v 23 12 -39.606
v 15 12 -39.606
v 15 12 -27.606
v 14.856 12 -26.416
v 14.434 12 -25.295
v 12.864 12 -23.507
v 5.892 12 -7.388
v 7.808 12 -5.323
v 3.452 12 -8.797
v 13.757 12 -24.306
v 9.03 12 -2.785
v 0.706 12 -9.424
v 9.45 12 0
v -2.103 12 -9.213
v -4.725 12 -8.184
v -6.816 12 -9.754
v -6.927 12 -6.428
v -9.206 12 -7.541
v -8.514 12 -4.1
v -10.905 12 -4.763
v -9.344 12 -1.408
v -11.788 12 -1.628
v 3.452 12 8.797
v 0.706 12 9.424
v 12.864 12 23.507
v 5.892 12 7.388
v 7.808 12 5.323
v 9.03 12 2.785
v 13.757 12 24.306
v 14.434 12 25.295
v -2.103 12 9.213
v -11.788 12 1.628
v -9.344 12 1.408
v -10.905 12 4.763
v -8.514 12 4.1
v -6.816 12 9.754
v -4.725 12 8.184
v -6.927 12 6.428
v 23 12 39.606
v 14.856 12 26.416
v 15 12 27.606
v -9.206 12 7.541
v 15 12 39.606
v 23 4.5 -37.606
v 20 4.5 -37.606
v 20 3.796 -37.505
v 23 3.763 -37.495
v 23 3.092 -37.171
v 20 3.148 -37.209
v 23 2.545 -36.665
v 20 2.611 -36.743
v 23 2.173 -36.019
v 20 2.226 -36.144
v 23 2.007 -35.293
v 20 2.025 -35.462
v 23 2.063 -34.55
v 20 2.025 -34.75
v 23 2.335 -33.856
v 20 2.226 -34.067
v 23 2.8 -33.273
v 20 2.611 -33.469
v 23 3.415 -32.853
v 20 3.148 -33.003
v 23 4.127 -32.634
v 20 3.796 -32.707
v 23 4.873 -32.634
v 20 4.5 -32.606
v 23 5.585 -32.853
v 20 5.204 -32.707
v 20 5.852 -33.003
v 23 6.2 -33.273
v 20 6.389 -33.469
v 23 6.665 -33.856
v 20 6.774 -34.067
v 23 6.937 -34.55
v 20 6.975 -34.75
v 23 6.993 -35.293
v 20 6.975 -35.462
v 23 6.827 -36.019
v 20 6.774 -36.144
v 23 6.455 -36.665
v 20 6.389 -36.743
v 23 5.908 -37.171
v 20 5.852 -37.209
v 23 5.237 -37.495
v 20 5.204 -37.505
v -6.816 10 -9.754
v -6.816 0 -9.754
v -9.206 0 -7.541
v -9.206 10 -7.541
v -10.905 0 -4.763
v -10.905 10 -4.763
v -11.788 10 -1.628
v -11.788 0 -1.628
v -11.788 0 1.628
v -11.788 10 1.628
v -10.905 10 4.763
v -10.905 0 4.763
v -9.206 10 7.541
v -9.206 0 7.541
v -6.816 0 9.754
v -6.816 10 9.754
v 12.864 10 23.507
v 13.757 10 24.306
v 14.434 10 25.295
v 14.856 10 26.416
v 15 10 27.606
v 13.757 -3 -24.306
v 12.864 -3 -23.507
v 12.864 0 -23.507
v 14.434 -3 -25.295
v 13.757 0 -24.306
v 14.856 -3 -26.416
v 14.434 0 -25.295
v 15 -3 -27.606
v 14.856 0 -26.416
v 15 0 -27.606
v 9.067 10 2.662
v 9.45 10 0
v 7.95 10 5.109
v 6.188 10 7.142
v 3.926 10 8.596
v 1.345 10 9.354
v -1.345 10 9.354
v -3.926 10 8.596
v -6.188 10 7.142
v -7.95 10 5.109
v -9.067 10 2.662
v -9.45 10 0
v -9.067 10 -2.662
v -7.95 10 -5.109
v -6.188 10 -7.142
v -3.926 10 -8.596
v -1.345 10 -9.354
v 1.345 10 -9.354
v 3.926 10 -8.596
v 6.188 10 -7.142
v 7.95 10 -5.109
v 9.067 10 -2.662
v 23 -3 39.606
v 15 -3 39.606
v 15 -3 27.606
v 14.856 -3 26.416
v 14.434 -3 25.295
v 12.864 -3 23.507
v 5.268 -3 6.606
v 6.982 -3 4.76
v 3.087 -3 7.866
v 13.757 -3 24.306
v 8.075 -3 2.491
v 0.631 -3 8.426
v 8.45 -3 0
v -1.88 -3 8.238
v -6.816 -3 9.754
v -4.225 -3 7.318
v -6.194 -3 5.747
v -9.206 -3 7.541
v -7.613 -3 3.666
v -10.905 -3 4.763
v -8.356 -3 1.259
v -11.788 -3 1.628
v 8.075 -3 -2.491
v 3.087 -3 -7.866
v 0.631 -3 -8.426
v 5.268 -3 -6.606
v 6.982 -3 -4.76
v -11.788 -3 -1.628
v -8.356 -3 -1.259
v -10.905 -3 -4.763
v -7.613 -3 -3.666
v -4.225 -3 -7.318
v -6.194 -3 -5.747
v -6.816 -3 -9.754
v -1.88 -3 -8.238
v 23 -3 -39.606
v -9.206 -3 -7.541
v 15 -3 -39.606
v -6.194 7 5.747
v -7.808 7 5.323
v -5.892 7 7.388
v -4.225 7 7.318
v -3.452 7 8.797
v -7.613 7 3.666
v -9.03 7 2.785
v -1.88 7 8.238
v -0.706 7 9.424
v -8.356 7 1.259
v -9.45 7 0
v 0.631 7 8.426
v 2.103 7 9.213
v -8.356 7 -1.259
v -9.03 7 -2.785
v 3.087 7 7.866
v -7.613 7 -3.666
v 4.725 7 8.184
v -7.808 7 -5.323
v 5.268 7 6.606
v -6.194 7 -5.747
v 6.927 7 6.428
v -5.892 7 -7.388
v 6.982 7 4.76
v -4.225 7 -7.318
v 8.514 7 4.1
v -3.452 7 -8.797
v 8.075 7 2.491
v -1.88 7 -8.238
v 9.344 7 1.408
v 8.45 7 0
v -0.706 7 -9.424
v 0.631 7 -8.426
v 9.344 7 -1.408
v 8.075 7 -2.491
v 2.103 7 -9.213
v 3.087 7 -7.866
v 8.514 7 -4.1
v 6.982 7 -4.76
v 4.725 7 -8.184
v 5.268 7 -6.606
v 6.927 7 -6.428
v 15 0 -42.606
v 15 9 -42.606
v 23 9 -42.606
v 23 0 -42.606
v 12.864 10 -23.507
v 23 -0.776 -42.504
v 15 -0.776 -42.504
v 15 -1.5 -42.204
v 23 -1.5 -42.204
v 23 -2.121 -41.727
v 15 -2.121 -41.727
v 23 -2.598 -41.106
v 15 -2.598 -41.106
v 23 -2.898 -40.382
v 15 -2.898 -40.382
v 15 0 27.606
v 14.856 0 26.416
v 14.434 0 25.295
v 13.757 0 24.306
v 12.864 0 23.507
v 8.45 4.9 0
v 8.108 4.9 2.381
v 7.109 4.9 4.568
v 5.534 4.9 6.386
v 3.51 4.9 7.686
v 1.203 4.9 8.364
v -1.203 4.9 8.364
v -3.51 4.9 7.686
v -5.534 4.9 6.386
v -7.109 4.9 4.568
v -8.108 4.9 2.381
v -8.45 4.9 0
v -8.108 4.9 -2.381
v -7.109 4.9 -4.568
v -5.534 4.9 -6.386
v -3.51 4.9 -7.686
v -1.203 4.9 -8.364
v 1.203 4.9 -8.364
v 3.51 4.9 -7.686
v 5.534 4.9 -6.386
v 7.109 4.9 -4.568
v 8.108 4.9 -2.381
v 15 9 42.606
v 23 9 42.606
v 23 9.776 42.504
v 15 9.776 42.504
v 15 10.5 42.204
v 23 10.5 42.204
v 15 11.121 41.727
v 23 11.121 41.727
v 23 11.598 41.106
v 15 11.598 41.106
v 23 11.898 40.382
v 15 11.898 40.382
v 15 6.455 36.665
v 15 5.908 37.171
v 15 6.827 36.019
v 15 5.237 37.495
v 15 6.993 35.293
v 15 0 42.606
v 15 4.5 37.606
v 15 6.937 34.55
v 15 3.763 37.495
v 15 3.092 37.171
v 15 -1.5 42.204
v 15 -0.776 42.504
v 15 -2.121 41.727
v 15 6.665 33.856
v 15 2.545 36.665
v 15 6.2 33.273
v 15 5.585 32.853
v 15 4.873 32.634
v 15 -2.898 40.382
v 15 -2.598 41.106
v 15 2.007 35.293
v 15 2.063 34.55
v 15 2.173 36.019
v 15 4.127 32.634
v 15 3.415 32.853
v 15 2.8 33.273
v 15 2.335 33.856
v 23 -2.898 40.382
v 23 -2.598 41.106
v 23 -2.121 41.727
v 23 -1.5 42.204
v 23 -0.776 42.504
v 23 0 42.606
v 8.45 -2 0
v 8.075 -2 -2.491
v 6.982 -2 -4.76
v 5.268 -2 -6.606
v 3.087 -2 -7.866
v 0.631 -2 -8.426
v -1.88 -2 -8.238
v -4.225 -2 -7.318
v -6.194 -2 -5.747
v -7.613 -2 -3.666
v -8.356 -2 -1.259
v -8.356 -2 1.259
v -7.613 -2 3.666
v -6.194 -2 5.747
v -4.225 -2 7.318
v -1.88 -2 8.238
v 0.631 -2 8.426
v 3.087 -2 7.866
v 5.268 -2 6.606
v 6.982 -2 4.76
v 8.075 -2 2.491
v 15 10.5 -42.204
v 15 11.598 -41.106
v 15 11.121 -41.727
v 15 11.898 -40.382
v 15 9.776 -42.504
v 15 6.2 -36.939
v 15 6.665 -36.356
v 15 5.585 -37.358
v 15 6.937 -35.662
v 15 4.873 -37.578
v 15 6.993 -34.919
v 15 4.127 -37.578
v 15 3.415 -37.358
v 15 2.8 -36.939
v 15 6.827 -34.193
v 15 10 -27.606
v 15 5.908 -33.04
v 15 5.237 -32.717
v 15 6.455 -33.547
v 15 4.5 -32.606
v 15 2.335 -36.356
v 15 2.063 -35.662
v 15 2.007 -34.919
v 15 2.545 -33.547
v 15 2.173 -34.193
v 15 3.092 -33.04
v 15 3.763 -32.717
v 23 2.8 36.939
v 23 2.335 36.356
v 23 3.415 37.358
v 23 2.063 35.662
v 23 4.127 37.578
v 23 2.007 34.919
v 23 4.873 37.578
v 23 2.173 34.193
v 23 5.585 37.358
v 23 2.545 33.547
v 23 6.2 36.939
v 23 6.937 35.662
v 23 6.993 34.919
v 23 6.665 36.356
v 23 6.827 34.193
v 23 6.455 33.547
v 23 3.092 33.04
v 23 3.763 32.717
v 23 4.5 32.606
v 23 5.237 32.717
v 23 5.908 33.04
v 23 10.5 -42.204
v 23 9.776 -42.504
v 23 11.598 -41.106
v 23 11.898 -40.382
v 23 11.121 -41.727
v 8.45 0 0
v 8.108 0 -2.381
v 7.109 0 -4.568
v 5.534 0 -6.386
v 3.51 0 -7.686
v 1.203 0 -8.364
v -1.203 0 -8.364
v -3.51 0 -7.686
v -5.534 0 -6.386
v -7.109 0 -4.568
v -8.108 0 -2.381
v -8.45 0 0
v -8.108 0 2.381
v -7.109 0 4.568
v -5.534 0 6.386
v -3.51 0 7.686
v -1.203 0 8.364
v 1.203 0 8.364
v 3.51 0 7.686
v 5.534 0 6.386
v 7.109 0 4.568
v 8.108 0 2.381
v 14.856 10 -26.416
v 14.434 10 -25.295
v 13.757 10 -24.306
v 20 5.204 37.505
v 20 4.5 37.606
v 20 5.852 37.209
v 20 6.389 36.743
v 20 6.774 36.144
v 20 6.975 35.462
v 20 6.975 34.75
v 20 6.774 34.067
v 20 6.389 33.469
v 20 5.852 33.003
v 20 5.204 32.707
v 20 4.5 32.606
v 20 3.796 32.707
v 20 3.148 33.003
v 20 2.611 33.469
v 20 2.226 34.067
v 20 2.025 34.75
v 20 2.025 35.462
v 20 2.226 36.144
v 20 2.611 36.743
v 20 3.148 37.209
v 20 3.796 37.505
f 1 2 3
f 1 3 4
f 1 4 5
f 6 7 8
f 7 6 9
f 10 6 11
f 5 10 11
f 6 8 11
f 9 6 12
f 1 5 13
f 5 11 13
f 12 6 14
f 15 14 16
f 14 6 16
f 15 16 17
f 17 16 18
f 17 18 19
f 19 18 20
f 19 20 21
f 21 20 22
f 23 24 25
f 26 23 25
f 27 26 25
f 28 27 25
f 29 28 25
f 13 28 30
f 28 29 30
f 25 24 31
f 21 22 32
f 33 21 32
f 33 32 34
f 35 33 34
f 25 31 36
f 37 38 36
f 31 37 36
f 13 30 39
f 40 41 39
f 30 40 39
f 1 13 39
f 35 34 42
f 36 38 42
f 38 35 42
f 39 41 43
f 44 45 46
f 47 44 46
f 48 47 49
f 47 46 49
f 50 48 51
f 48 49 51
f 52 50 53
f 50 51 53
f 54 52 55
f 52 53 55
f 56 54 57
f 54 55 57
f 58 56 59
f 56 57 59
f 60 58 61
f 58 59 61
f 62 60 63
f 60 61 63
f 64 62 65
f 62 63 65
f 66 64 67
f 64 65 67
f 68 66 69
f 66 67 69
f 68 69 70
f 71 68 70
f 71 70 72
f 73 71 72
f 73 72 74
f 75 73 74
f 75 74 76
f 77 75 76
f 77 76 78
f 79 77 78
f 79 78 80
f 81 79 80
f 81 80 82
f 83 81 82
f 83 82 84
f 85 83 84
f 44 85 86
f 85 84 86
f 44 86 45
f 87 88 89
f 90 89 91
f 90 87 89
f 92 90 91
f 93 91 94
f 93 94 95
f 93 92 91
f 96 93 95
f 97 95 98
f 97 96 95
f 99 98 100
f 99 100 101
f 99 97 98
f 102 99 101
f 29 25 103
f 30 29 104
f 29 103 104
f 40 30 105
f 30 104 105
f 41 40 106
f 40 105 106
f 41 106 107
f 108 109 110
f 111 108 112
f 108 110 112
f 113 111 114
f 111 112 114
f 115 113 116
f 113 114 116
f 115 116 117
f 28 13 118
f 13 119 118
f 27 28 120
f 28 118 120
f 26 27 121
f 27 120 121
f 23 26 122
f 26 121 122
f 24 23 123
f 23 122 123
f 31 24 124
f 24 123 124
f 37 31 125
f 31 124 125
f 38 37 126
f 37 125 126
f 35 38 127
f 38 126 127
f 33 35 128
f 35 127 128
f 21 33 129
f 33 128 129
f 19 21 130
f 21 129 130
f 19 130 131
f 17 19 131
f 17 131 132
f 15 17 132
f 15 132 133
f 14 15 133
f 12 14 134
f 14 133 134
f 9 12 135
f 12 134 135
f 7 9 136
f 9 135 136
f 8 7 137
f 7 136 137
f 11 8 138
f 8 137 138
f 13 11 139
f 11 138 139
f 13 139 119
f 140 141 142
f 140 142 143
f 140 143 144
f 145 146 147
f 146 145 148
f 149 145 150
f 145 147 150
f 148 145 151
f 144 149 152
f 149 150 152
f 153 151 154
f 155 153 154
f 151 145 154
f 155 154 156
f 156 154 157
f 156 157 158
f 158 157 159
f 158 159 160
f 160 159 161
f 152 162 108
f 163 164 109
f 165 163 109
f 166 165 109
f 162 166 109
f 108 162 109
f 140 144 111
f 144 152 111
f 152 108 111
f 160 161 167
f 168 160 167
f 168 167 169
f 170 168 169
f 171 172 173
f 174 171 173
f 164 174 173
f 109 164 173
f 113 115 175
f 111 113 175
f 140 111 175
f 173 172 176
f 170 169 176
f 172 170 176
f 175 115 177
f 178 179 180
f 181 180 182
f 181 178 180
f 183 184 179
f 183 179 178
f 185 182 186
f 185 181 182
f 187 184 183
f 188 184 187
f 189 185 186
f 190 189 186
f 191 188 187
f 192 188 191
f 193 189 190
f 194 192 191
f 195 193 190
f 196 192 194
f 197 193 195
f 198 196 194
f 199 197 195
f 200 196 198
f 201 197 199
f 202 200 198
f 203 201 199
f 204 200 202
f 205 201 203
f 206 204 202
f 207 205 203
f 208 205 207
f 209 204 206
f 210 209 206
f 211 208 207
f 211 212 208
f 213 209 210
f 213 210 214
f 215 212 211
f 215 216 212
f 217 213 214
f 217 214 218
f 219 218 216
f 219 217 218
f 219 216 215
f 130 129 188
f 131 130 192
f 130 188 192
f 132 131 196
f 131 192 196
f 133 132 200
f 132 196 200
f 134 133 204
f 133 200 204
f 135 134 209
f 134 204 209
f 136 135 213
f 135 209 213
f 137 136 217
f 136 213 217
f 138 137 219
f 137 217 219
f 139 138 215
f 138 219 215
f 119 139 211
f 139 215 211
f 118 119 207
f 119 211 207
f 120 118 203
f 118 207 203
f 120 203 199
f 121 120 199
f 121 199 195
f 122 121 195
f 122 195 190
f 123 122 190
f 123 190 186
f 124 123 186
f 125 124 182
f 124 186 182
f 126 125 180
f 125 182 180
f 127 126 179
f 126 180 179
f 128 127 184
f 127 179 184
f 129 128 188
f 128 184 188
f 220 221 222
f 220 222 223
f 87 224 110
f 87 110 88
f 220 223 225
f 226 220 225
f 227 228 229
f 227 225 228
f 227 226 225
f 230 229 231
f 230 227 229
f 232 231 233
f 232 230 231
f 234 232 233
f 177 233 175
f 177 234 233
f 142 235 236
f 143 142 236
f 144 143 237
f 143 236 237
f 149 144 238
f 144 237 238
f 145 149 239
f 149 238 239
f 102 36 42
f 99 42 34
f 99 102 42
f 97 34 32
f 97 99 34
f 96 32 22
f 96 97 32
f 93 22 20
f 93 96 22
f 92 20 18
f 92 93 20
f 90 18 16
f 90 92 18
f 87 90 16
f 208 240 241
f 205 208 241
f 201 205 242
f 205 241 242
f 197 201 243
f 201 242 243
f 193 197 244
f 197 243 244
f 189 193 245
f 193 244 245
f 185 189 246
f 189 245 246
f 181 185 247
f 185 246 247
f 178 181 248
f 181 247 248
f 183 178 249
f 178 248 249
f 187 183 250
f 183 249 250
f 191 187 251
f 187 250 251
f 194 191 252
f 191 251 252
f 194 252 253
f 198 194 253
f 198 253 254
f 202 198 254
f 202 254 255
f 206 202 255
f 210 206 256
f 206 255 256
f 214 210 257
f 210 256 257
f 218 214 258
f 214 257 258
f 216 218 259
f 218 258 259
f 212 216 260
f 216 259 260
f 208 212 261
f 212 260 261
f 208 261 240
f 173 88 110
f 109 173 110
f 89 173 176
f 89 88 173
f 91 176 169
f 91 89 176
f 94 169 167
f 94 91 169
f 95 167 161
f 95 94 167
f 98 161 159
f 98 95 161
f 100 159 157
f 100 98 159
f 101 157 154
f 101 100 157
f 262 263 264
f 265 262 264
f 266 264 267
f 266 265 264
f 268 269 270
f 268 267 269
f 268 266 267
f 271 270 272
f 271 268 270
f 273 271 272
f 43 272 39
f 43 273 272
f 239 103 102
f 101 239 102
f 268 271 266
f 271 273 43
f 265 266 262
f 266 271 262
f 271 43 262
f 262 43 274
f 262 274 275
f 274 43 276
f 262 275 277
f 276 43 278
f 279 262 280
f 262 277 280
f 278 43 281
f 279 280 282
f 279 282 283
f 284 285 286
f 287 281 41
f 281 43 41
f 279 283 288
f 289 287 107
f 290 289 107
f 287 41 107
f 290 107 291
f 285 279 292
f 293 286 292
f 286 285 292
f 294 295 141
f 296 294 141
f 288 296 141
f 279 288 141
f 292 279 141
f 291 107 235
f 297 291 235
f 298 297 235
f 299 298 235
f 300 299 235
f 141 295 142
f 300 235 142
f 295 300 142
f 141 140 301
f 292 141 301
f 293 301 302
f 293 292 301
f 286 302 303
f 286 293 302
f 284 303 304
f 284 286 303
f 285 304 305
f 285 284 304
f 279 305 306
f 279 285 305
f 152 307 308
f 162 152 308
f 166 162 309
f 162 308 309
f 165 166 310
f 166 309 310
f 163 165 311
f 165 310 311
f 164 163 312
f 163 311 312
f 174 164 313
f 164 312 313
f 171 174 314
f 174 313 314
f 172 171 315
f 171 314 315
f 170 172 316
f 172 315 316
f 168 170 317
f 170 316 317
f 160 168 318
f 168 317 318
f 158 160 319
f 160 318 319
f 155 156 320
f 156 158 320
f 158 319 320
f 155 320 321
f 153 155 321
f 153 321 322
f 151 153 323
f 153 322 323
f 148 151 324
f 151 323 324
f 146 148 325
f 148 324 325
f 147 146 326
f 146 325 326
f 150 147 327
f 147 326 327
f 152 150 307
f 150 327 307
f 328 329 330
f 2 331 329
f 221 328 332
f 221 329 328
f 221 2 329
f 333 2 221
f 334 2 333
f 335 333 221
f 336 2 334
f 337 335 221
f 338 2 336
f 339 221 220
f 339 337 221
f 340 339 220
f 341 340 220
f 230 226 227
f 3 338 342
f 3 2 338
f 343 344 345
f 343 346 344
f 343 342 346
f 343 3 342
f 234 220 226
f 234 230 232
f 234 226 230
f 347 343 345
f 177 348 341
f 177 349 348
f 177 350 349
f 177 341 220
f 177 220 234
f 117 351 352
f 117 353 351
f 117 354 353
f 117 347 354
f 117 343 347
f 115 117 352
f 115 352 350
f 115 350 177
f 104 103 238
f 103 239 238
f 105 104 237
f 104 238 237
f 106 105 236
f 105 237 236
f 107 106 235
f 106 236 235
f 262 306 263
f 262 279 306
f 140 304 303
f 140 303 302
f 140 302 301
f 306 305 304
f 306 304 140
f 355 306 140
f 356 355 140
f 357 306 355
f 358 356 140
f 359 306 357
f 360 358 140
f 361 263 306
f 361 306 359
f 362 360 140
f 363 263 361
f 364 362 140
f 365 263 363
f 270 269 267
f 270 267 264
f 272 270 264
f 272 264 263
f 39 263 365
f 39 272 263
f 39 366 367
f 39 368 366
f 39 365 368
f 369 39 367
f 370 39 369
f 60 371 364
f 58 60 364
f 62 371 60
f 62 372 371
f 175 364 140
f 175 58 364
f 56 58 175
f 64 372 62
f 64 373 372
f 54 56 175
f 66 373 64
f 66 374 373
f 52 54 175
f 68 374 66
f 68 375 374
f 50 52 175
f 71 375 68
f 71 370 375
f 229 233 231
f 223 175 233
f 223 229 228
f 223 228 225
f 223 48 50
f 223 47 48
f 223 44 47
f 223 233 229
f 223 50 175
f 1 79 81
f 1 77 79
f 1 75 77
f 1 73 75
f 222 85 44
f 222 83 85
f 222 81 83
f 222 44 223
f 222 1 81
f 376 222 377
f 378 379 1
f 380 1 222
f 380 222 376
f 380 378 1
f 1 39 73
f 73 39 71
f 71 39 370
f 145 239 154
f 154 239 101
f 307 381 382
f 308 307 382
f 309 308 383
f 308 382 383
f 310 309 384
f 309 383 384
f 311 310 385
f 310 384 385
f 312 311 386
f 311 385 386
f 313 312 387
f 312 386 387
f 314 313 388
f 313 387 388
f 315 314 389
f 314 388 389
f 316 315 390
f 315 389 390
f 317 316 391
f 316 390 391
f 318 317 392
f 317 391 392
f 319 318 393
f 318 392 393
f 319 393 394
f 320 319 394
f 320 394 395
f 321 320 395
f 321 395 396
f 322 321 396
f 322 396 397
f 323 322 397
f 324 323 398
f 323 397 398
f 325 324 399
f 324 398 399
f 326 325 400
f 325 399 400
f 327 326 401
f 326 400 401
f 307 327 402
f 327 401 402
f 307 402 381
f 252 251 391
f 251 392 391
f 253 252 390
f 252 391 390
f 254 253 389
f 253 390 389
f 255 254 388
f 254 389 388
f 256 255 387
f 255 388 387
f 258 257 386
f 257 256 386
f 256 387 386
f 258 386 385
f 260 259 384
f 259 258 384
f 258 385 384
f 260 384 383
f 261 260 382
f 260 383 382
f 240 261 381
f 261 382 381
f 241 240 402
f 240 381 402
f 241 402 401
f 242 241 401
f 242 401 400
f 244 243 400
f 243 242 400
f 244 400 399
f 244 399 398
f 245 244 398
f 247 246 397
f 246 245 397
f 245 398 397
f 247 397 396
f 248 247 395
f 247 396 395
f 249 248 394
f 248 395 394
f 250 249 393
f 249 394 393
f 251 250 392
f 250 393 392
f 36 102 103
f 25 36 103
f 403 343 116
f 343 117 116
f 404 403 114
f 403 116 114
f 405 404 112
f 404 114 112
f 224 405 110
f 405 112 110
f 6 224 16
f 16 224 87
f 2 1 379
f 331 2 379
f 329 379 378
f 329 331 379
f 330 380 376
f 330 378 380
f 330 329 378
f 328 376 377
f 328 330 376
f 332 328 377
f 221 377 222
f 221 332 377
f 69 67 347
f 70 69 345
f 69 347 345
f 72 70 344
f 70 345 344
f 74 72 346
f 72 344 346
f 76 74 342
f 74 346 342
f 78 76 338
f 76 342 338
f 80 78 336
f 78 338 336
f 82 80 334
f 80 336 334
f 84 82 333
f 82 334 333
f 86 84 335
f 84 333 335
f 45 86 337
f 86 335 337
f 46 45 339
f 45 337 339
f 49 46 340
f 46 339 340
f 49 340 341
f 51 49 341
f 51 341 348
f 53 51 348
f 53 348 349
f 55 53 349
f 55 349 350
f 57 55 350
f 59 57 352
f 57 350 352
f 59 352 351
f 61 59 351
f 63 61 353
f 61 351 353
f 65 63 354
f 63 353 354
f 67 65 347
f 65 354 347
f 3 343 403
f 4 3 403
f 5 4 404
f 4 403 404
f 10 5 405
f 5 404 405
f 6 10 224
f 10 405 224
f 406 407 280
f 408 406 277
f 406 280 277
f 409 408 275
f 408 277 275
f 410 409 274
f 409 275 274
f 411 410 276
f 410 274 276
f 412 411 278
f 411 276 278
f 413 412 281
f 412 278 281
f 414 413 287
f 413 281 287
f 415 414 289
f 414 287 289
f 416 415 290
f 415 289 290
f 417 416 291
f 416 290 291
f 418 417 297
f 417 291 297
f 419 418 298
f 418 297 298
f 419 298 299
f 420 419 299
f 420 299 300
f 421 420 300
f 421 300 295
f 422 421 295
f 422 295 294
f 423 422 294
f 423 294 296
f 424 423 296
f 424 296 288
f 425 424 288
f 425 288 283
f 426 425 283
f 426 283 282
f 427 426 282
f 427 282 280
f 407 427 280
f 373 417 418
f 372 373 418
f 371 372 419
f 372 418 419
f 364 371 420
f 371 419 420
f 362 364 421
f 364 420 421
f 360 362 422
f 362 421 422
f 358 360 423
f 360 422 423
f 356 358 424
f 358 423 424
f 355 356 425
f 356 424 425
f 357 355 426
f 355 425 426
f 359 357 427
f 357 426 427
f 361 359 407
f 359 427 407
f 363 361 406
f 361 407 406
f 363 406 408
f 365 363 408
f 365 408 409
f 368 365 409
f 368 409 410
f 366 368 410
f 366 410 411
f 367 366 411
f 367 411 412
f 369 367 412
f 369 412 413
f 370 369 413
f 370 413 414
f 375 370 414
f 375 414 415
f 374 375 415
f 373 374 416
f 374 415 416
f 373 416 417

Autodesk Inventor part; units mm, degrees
ref_plane "YZ Plane" through (0, 0, 0) normal (1, 0, 0) x (0, 1, 0)
ref_plane "XZ Plane" through (0, 0, 0) normal (0, 1, 0) x (-1, 0, 0)
ref_plane "XY Plane" through (0, 0, 0) normal (0, 0, 1) x (1, 0, 0)
sketch "Sketch1" plane through (0, 0, 0) normal (0, 1, 0) x (-1, 0, 0)
  circle A0 centre (0, 0) radius 9.45
  circle A1 centre (0, 0) radius 8.45
  line L0 (15.45, 25) -> (15.45, -25)
  line L1 (-20, 0) -> (-15, 0)
  line L2 (-15, 0) -> (-15, 25)
  line L3 (-15, 25) -> (-20, 25)
  line L4 (-20, 25) -> (-20, 0)
  line L5 (-20, 0) -> (-15, 0)
  line L6 (-15, 0) -> (-15, -25)
  line L7 (-15, -25) -> (-20, -25)
  line L8 (-20, -25) -> (-20, 0)
  line L9 (15.45, 25) -> (-20, 25)
  line L10 (-20, 25) -> (-20, -25)
  line L11 (-20, -25) -> (15.45, -25)
  line L12 (15.45, -25) -> (15.45, 25)
  point P0 (15.45, 0)
  dimension "d0" = 18.9
  dimension "d1" = 16.9
  dimension "d7" = 5
  dimension "d8" = 20
extrude "Extrusion1" add sketch "Sketch1" along normal blind 10 contours L0 L11 L6 L2 L9 | L2 L1 L4 L3 | L7 L8 L1 L6
extrude "Extrusion2" add sketch "Sketch1" along normal blind 4.9 contours A0
sketch "Sketch2" plane through (0, 10, 0) normal (0, 1, 0) x (1, 0, 0)
  circle A0 centre (0, 0) radius 11.9
  line L0 (-15.45, -25) -> (20, -25) projected
  line L1 (20, 25) -> (-15.45, 25) projected
  line L2 (20, -25) -> (15, -25)
  line L3 (15, -25) -> (15, 25)
  line L4 (15, 25) -> (20, 25)
  line L5 (20, 25) -> (20, -25)
  line L6 (-15.45, 25) -> (-15.45, -25) projected
  line L7 (20, -25) -> (-15.45, -25)
  line L8 (-15.45, -25) -> (-15.45, 25)
  line L9 (-15.45, 25) -> (20, 25)
  line L10 (20, 25) -> (20, -25)
  point P0 (-6.8165, -9.7543)
  point P1 (-6.8165, 9.7543)
  dimension "d13" = 23.8
  dimension "d14" = 5
sketch "Sketch7" plane through (20, 0, -25) normal (0, 0, -1) x (-1, 0, 0)
  line L0 (35.45, 0) -> (35.45, 10) projected
  line L1 (0, 0) -> (35.45, 0)
  line L2 (35.45, 0) -> (35.45, 10)
  line L3 (35.45, 10) -> (0, 10)
  line L4 (0, 10) -> (0, 0)
  point P0 (20, 0)
extrude "Extrusion7" add sketch "Sketch7" along normal blind 10
sketch "Sketch8" plane through (-15.45, 0, 25) normal (0, 0, 1) x (1, 0, 0)
  line L0 (35.45, 0) -> (35.45, 10) projected
  line L1 (0, 0) -> (0, 10) projected
  line L2 (35.45, 0) -> (0, 0)
  line L3 (0, 0) -> (0, 10)
  line L4 (0, 10) -> (35.45, 10)
  line L5 (35.45, 10) -> (35.45, 0)
  point P0 (15.45, 0)
extrude "Extrusion8" add sketch "Sketch8" along normal blind 10
sketch "Sketch9" plane through (0, 10, 0) normal (0, 1, 0) x (1, 0, 0)
  circle A0 centre (0, 0) radius 11.9 projected
  line L0 (15, -25) -> (15, 25) projected
  line L1 (15, -25) -> (-6.8165, -9.7543)
  line L2 (15, 25) -> (-6.8165, 9.7543)
  line L3 (20, 35) -> (20, -35) projected
  line L4 (20, 25) -> (15, 25)
  line L5 (15, 25) -> (15, 35)
  line L6 (15, 35) -> (20, 35)
  line L7 (20, 35) -> (20, 25)
  line L8 (20, -25) -> (15, -25)
  line L9 (15, -25) -> (15, -35)
  line L10 (15, -35) -> (20, -35)
  line L11 (20, -35) -> (20, -25)
  line L12 (15, -25) -> (15, 25)
  line L13 (-15.45, -35) -> (-15.45, 35) projected
  line L14 (-15.45, 25) -> (15, 25)
  line L15 (15, -25) -> (-15.45, -25)
  line L16 (-15.45, -25) -> (-15.45, 25)
  line L17 (15, -25) -> (-15.45, -25)
  line L18 (-15.45, -25) -> (-15.45, -35)
  line L19 (-15.45, -35) -> (15, -35)
  line L20 (15, -35) -> (15, -25)
  line L21 (20, 35) -> (-15.45, 35) projected
  line L22 (15, 25) -> (-15.45, 25)
  line L23 (-15.45, 25) -> (-15.45, 35)
  line L24 (-15.45, 35) -> (15, 35)
  line L25 (15, 35) -> (15, 25)
  point P0 (15, 25)
  dimension "d27" = 10
extrude "Extrusion9" cut sketch "Sketch9" against normal blind 10 contours A0 L1 L15 L13 L14 L2
extrude "Extrusion10" cut sketch "Sketch9" against normal blind 10 contours L14 L13 L21 L5 | L9 L19 L13 L15
fillet "Fillet1" radius 5 2 edges at (15, 5, 25) (15, 5, -25)
sketch "Sketch10" plane through (-15.45, 0, 35) normal (0, 0, 1) x (1, 0, 0)
  line L0 (35.45, 10) -> (35.45, 0) projected
  line L1 (30.45, 10) -> (30.45, 0) projected
  line L2 (35.45, 0) -> (30.45, 0)
  line L3 (30.45, 0) -> (30.45, 10)
  line L4 (30.45, 10) -> (35.45, 10)
  line L5 (35.45, 10) -> (35.45, 0)
  point P0 (15.45, 0)
extrude "Extrusion11" add sketch "Sketch10" along normal blind 2.606
sketch "Sketch11" plane through (20, 0, -35) normal (0, 0, -1) x (-1, 0, 0)
  line L0 (5, 10) -> (0, 10) projected
  line L1 (5, 10) -> (5, 0) projected
  line L2 (0, 10) -> (5, 10)
  line L3 (5, 10) -> (5, 0)
  line L4 (5, 0) -> (0, 0)
  line L5 (0, 0) -> (0, 10)
  point P0 (20, 0)
extrude "Extrusion12" add sketch "Sketch11" along normal blind 2.606
sketch "Sketch14" plane through (0, 10, 0) normal (0, 1, 0) x (1, 0, 0)
  circle A0 centre (0, 0) radius 9.45 projected
  line L0 (15, 37.606) -> (15, 27.6058) projected
  arc A1 (12.8641, 23.5074) -> (15, 27.6058) centre (10, 27.6058) ccw projected
  line L1 (12.8641, 23.5074) -> (-6.8165, 9.7543) projected
  arc A2 (-6.8165, 9.7543) -> (-6.8165, -9.7543) centre (0, 0) ccw projected
  line L2 (-6.8165, -9.7543) -> (12.8641, -23.5074) projected
  arc A3 (15, -27.6058) -> (12.8641, -23.5074) centre (10, -27.6058) ccw projected
  line L3 (15, -27.6058) -> (15, -37.606) projected
  line L4 (20, -37.606) -> (15, -37.606) projected
  line L5 (20, 37.606) -> (20, -37.606) projected
  line L6 (15, 37.606) -> (20, 37.606) projected
extrude "Extrusion15" add sketch "Sketch14" along normal blind 2
sketch "Sketch15" plane through (0, 0, 0) normal (0, -1, 0) x (1, 0, 0)
  line L0 (15, -27.6058) -> (15, -37.606) projected
  line L1 (20, -37.606) -> (15, -37.606) projected
  line L2 (20, 37.606) -> (20, -37.606) projected
  line L3 (15, 37.606) -> (20, 37.606) projected
  line L4 (15, 37.606) -> (15, 27.6058) projected
  arc A0 (12.8641, 23.5074) -> (15, 27.6058) centre (10, 27.6058) ccw projected
  line L5 (12.8641, 23.5074) -> (-6.8165, 9.7543) projected
  arc A1 (-6.8165, 9.7543) -> (-6.8165, -9.7543) centre (0, 0) ccw projected
  line L6 (-6.8165, -9.7543) -> (12.8641, -23.5074) projected
  arc A2 (15, -27.6058) -> (12.8641, -23.5074) centre (10, -27.6058) ccw projected
  circle A3 centre (0, 0) radius 8.45 projected
extrude "Extrusion16" add sketch "Sketch15" along normal blind 2
sketch "Sketch16" plane through (0, 4.9, 0) normal (0, 1, 0) x (1, 0, 0)
  circle A0 centre (0, 0) radius 9.45 projected
  circle A1 centre (0, 0) radius 8.45 projected
extrude "Extrusion17" add sketch "Sketch16" along normal blind 2.1
sketch "Sketch17" plane through (-15.45, 0, 37.606) normal (0, 0, 1) x (1, 0, 0)
  line L0 (35.45, 12) -> (35.45, -2) projected
  line L1 (30.45, 12) -> (35.45, 12) projected
  line L2 (30.45, -2) -> (30.45, 12) projected
  line L3 (35.45, -2) -> (30.45, -2) projected
  point P0 (15.45, 0)
extrude "Extrusion18" add sketch "Sketch17" along normal blind 4
sketch "Sketch18" plane through (20, 0, -37.606) normal (0, 0, -1) x (-1, 0, 0)
  line L0 (5, 12) -> (5, -2) projected
  line L1 (0, 12) -> (5, 12) projected
  line L2 (0, -2) -> (0, 12) projected
  line L3 (5, -2) -> (0, -2) projected
  point P0 (20, 0)
extrude "Extrusion19" add sketch "Sketch18" along normal blind 4
sketch "Sketch22" plane through (0, -2, 0) normal (0, -1, 0) x (1, 0, 0)
  arc A0 (-6.8165, 9.7543) -> (-6.8165, -9.7543) centre (0, 0) ccw projected
  line L0 (-6.8165, -9.7543) -> (12.8641, -23.5074) projected
  arc A1 (15, -27.6058) -> (12.8641, -23.5074) centre (10, -27.6058) ccw projected
  line L1 (15, -27.6058) -> (15, -41.606) projected
  line L2 (20, -41.606) -> (15, -41.606) projected
  line L3 (20, 41.606) -> (20, -41.606) projected
  line L4 (15, 41.606) -> (20, 41.606) projected
  line L5 (15, 27.6058) -> (15, 41.606) projected
  arc A2 (12.8641, 23.5074) -> (15, 27.6058) centre (10, 27.6058) ccw projected
  line L6 (12.8641, 23.5074) -> (-6.8165, 9.7543) projected
  circle A3 centre (0, 0) radius 8.45 projected
extrude "Extrusion22" add sketch "Sketch22" along normal blind 1
sketch "Sketch23" plane through (-15.45, 0, 41.606) normal (0, 0, 1) x (1, 0, 0)
  line L0 (30.45, 12) -> (30.45, -3) projected
  line L1 (35.45, -3) -> (30.45, -3) projected
  line L2 (35.45, 12) -> (35.45, -3) projected
  line L3 (35.45, 12) -> (30.45, 12) projected
  line L4 (35.45, 12) -> (35.45, -3) projected
  line L5 (30.45, -3) -> (35.45, -3) projected
  line L6 (30.45, 12) -> (30.45, -3) projected
  line L7 (30.45, 12) -> (35.45, 12) projected
  point P0 (15.45, 0)
sketch "Sketch24" plane through (-15.45, 0, 41.606) normal (0, 0, 1) x (1, 0, 0)
  point P0 (15.45, 0)
extrude "Extrusion23" add sketch "Sketch23" along normal blind 1
sketch "Sketch25" plane through (20, 0, -41.606) normal (0, 0, -1) x (-1, 0, 0)
  line L0 (0, 12) -> (0, -3) projected
  line L1 (5, -3) -> (0, -3) projected
  line L2 (5, 12) -> (5, -3) projected
  line L3 (5, 12) -> (0, 12) projected
  point P0 (20, 0)
extrude "Extrusion24" add sketch "Sketch25" along normal blind 1
sketch "Sketch26" plane through (15, -3, 27.6058) normal (-1, 0, 0) x (0, 0, 1)
  line L0 (0, 0) -> (0, 15) projected
  line L1 (0, 0) -> (15.0002, 0) projected
  line L2 (15.0002, 15) -> (15.0002, 0) projected
  line L3 (0, 15) -> (15.0002, 15) projected
  circle A0 centre (7.5001, 7.5) radius 2.5
  point P0 (-27.6058, 3)
  dimension "d67" = 5
extrude "Extrusion25" cut sketch "Sketch26" against normal up to surface (5 mm away) contours A0
sketch "Sketch27" plane through (15, -3, -27.6058) normal (-1, 0, 0) x (0, 0, 1)
  line L0 (0, 15) -> (0, 0) projected
  line L1 (0, 15) -> (-15.0002, 15) projected
  line L2 (-15.0002, 0) -> (-15.0002, 15) projected
  line L3 (0, 0) -> (-15.0002, 0) projected
  circle A0 centre (-7.5001, 7.5) radius 2.5
  point P0 (27.6058, 3)
  dimension "d70" = 5
extrude "Extrusion26" cut sketch "Sketch27" against normal up to surface (5 mm away) contours A0
fillet "Fillet4" radius 3 4 edges at (17.5, 12, 42.606) (17.5, -3, 42.606) (17.5, -3, -42.606) (17.5, 12, -42.606)
sketch "Sketch28" plane through (20, 0, 42.606) normal (1, 0, 0) x (0, 0, -1)
  arc A0 (85.212, 9) -> (82.212, 12) centre (82.212, 9) ccw projected
  line L0 (82.212, 12) -> (3, 12) projected
  arc A1 (3, 12) -> (0, 9) centre (3, 9) ccw projected
  line L1 (0, 0) -> (0, 9) projected
  arc A2 (0, 0) -> (3, -3) centre (3, 0) ccw projected
  line L2 (3, -3) -> (82.212, -3) projected
  arc A3 (82.212, -3) -> (85.212, 0) centre (82.212, 0) ccw projected
  line L3 (85.212, 9) -> (85.212, 0) projected
  circle A4 centre (77.7119, 4.5) radius 2.5 projected
  circle A5 centre (7.5001, 4.5) radius 2.5 projected
  point P0 (42.606, 0)
extrude "Extrusion27" add sketch "Sketch28" along normal blind 3
sketch "Sketch29" plane through (0, 12, 0) normal (0, 1, 0) x (1, 0, 0)
  line L0 (15, 39.606) -> (23, 39.606) projected
  line L1 (15, 27.6058) -> (15, 39.606) projected
  arc A0 (12.8641, 23.5074) -> (15, 27.6058) centre (10, 27.6058) ccw projected
  line L2 (12.8641, 23.5074) -> (-6.8165, 9.7543) projected
  arc A1 (-6.8165, 9.7543) -> (-6.8165, -9.7543) centre (0, 0) ccw projected
  line L3 (-6.8165, -9.7543) -> (12.8641, -23.5074) projected
  arc A2 (15, -27.6058) -> (12.8641, -23.5074) centre (10, -27.6058) ccw projected
  line L4 (15, -27.6058) -> (15, -39.606) projected
  line L5 (23, -39.606) -> (15, -39.606) projected
  line L6 (23, 39.606) -> (23, -39.606) projected
  circle A3 centre (0, 0) radius 9.45 projected
  circle A4 centre (0, 0) radius 8.45 projected
  line L7 (15, 39.606) -> (15, 42.606) projected
  line L8 (15, 42.606) -> (23, 42.606) projected
  line L9 (23, 39.606) -> (23, 42.606) projected
  line L10 (15, -42.606) -> (23, -42.606) projected
  line L11 (15, -42.606) -> (15, -39.606) projected
  line L12 (23, -42.606) -> (23, -39.606) projected
  dimension "d76" = 18.9
  dimension "d77" = 16.9
properties part number "mancal[1]" material "Steel, Mild"
